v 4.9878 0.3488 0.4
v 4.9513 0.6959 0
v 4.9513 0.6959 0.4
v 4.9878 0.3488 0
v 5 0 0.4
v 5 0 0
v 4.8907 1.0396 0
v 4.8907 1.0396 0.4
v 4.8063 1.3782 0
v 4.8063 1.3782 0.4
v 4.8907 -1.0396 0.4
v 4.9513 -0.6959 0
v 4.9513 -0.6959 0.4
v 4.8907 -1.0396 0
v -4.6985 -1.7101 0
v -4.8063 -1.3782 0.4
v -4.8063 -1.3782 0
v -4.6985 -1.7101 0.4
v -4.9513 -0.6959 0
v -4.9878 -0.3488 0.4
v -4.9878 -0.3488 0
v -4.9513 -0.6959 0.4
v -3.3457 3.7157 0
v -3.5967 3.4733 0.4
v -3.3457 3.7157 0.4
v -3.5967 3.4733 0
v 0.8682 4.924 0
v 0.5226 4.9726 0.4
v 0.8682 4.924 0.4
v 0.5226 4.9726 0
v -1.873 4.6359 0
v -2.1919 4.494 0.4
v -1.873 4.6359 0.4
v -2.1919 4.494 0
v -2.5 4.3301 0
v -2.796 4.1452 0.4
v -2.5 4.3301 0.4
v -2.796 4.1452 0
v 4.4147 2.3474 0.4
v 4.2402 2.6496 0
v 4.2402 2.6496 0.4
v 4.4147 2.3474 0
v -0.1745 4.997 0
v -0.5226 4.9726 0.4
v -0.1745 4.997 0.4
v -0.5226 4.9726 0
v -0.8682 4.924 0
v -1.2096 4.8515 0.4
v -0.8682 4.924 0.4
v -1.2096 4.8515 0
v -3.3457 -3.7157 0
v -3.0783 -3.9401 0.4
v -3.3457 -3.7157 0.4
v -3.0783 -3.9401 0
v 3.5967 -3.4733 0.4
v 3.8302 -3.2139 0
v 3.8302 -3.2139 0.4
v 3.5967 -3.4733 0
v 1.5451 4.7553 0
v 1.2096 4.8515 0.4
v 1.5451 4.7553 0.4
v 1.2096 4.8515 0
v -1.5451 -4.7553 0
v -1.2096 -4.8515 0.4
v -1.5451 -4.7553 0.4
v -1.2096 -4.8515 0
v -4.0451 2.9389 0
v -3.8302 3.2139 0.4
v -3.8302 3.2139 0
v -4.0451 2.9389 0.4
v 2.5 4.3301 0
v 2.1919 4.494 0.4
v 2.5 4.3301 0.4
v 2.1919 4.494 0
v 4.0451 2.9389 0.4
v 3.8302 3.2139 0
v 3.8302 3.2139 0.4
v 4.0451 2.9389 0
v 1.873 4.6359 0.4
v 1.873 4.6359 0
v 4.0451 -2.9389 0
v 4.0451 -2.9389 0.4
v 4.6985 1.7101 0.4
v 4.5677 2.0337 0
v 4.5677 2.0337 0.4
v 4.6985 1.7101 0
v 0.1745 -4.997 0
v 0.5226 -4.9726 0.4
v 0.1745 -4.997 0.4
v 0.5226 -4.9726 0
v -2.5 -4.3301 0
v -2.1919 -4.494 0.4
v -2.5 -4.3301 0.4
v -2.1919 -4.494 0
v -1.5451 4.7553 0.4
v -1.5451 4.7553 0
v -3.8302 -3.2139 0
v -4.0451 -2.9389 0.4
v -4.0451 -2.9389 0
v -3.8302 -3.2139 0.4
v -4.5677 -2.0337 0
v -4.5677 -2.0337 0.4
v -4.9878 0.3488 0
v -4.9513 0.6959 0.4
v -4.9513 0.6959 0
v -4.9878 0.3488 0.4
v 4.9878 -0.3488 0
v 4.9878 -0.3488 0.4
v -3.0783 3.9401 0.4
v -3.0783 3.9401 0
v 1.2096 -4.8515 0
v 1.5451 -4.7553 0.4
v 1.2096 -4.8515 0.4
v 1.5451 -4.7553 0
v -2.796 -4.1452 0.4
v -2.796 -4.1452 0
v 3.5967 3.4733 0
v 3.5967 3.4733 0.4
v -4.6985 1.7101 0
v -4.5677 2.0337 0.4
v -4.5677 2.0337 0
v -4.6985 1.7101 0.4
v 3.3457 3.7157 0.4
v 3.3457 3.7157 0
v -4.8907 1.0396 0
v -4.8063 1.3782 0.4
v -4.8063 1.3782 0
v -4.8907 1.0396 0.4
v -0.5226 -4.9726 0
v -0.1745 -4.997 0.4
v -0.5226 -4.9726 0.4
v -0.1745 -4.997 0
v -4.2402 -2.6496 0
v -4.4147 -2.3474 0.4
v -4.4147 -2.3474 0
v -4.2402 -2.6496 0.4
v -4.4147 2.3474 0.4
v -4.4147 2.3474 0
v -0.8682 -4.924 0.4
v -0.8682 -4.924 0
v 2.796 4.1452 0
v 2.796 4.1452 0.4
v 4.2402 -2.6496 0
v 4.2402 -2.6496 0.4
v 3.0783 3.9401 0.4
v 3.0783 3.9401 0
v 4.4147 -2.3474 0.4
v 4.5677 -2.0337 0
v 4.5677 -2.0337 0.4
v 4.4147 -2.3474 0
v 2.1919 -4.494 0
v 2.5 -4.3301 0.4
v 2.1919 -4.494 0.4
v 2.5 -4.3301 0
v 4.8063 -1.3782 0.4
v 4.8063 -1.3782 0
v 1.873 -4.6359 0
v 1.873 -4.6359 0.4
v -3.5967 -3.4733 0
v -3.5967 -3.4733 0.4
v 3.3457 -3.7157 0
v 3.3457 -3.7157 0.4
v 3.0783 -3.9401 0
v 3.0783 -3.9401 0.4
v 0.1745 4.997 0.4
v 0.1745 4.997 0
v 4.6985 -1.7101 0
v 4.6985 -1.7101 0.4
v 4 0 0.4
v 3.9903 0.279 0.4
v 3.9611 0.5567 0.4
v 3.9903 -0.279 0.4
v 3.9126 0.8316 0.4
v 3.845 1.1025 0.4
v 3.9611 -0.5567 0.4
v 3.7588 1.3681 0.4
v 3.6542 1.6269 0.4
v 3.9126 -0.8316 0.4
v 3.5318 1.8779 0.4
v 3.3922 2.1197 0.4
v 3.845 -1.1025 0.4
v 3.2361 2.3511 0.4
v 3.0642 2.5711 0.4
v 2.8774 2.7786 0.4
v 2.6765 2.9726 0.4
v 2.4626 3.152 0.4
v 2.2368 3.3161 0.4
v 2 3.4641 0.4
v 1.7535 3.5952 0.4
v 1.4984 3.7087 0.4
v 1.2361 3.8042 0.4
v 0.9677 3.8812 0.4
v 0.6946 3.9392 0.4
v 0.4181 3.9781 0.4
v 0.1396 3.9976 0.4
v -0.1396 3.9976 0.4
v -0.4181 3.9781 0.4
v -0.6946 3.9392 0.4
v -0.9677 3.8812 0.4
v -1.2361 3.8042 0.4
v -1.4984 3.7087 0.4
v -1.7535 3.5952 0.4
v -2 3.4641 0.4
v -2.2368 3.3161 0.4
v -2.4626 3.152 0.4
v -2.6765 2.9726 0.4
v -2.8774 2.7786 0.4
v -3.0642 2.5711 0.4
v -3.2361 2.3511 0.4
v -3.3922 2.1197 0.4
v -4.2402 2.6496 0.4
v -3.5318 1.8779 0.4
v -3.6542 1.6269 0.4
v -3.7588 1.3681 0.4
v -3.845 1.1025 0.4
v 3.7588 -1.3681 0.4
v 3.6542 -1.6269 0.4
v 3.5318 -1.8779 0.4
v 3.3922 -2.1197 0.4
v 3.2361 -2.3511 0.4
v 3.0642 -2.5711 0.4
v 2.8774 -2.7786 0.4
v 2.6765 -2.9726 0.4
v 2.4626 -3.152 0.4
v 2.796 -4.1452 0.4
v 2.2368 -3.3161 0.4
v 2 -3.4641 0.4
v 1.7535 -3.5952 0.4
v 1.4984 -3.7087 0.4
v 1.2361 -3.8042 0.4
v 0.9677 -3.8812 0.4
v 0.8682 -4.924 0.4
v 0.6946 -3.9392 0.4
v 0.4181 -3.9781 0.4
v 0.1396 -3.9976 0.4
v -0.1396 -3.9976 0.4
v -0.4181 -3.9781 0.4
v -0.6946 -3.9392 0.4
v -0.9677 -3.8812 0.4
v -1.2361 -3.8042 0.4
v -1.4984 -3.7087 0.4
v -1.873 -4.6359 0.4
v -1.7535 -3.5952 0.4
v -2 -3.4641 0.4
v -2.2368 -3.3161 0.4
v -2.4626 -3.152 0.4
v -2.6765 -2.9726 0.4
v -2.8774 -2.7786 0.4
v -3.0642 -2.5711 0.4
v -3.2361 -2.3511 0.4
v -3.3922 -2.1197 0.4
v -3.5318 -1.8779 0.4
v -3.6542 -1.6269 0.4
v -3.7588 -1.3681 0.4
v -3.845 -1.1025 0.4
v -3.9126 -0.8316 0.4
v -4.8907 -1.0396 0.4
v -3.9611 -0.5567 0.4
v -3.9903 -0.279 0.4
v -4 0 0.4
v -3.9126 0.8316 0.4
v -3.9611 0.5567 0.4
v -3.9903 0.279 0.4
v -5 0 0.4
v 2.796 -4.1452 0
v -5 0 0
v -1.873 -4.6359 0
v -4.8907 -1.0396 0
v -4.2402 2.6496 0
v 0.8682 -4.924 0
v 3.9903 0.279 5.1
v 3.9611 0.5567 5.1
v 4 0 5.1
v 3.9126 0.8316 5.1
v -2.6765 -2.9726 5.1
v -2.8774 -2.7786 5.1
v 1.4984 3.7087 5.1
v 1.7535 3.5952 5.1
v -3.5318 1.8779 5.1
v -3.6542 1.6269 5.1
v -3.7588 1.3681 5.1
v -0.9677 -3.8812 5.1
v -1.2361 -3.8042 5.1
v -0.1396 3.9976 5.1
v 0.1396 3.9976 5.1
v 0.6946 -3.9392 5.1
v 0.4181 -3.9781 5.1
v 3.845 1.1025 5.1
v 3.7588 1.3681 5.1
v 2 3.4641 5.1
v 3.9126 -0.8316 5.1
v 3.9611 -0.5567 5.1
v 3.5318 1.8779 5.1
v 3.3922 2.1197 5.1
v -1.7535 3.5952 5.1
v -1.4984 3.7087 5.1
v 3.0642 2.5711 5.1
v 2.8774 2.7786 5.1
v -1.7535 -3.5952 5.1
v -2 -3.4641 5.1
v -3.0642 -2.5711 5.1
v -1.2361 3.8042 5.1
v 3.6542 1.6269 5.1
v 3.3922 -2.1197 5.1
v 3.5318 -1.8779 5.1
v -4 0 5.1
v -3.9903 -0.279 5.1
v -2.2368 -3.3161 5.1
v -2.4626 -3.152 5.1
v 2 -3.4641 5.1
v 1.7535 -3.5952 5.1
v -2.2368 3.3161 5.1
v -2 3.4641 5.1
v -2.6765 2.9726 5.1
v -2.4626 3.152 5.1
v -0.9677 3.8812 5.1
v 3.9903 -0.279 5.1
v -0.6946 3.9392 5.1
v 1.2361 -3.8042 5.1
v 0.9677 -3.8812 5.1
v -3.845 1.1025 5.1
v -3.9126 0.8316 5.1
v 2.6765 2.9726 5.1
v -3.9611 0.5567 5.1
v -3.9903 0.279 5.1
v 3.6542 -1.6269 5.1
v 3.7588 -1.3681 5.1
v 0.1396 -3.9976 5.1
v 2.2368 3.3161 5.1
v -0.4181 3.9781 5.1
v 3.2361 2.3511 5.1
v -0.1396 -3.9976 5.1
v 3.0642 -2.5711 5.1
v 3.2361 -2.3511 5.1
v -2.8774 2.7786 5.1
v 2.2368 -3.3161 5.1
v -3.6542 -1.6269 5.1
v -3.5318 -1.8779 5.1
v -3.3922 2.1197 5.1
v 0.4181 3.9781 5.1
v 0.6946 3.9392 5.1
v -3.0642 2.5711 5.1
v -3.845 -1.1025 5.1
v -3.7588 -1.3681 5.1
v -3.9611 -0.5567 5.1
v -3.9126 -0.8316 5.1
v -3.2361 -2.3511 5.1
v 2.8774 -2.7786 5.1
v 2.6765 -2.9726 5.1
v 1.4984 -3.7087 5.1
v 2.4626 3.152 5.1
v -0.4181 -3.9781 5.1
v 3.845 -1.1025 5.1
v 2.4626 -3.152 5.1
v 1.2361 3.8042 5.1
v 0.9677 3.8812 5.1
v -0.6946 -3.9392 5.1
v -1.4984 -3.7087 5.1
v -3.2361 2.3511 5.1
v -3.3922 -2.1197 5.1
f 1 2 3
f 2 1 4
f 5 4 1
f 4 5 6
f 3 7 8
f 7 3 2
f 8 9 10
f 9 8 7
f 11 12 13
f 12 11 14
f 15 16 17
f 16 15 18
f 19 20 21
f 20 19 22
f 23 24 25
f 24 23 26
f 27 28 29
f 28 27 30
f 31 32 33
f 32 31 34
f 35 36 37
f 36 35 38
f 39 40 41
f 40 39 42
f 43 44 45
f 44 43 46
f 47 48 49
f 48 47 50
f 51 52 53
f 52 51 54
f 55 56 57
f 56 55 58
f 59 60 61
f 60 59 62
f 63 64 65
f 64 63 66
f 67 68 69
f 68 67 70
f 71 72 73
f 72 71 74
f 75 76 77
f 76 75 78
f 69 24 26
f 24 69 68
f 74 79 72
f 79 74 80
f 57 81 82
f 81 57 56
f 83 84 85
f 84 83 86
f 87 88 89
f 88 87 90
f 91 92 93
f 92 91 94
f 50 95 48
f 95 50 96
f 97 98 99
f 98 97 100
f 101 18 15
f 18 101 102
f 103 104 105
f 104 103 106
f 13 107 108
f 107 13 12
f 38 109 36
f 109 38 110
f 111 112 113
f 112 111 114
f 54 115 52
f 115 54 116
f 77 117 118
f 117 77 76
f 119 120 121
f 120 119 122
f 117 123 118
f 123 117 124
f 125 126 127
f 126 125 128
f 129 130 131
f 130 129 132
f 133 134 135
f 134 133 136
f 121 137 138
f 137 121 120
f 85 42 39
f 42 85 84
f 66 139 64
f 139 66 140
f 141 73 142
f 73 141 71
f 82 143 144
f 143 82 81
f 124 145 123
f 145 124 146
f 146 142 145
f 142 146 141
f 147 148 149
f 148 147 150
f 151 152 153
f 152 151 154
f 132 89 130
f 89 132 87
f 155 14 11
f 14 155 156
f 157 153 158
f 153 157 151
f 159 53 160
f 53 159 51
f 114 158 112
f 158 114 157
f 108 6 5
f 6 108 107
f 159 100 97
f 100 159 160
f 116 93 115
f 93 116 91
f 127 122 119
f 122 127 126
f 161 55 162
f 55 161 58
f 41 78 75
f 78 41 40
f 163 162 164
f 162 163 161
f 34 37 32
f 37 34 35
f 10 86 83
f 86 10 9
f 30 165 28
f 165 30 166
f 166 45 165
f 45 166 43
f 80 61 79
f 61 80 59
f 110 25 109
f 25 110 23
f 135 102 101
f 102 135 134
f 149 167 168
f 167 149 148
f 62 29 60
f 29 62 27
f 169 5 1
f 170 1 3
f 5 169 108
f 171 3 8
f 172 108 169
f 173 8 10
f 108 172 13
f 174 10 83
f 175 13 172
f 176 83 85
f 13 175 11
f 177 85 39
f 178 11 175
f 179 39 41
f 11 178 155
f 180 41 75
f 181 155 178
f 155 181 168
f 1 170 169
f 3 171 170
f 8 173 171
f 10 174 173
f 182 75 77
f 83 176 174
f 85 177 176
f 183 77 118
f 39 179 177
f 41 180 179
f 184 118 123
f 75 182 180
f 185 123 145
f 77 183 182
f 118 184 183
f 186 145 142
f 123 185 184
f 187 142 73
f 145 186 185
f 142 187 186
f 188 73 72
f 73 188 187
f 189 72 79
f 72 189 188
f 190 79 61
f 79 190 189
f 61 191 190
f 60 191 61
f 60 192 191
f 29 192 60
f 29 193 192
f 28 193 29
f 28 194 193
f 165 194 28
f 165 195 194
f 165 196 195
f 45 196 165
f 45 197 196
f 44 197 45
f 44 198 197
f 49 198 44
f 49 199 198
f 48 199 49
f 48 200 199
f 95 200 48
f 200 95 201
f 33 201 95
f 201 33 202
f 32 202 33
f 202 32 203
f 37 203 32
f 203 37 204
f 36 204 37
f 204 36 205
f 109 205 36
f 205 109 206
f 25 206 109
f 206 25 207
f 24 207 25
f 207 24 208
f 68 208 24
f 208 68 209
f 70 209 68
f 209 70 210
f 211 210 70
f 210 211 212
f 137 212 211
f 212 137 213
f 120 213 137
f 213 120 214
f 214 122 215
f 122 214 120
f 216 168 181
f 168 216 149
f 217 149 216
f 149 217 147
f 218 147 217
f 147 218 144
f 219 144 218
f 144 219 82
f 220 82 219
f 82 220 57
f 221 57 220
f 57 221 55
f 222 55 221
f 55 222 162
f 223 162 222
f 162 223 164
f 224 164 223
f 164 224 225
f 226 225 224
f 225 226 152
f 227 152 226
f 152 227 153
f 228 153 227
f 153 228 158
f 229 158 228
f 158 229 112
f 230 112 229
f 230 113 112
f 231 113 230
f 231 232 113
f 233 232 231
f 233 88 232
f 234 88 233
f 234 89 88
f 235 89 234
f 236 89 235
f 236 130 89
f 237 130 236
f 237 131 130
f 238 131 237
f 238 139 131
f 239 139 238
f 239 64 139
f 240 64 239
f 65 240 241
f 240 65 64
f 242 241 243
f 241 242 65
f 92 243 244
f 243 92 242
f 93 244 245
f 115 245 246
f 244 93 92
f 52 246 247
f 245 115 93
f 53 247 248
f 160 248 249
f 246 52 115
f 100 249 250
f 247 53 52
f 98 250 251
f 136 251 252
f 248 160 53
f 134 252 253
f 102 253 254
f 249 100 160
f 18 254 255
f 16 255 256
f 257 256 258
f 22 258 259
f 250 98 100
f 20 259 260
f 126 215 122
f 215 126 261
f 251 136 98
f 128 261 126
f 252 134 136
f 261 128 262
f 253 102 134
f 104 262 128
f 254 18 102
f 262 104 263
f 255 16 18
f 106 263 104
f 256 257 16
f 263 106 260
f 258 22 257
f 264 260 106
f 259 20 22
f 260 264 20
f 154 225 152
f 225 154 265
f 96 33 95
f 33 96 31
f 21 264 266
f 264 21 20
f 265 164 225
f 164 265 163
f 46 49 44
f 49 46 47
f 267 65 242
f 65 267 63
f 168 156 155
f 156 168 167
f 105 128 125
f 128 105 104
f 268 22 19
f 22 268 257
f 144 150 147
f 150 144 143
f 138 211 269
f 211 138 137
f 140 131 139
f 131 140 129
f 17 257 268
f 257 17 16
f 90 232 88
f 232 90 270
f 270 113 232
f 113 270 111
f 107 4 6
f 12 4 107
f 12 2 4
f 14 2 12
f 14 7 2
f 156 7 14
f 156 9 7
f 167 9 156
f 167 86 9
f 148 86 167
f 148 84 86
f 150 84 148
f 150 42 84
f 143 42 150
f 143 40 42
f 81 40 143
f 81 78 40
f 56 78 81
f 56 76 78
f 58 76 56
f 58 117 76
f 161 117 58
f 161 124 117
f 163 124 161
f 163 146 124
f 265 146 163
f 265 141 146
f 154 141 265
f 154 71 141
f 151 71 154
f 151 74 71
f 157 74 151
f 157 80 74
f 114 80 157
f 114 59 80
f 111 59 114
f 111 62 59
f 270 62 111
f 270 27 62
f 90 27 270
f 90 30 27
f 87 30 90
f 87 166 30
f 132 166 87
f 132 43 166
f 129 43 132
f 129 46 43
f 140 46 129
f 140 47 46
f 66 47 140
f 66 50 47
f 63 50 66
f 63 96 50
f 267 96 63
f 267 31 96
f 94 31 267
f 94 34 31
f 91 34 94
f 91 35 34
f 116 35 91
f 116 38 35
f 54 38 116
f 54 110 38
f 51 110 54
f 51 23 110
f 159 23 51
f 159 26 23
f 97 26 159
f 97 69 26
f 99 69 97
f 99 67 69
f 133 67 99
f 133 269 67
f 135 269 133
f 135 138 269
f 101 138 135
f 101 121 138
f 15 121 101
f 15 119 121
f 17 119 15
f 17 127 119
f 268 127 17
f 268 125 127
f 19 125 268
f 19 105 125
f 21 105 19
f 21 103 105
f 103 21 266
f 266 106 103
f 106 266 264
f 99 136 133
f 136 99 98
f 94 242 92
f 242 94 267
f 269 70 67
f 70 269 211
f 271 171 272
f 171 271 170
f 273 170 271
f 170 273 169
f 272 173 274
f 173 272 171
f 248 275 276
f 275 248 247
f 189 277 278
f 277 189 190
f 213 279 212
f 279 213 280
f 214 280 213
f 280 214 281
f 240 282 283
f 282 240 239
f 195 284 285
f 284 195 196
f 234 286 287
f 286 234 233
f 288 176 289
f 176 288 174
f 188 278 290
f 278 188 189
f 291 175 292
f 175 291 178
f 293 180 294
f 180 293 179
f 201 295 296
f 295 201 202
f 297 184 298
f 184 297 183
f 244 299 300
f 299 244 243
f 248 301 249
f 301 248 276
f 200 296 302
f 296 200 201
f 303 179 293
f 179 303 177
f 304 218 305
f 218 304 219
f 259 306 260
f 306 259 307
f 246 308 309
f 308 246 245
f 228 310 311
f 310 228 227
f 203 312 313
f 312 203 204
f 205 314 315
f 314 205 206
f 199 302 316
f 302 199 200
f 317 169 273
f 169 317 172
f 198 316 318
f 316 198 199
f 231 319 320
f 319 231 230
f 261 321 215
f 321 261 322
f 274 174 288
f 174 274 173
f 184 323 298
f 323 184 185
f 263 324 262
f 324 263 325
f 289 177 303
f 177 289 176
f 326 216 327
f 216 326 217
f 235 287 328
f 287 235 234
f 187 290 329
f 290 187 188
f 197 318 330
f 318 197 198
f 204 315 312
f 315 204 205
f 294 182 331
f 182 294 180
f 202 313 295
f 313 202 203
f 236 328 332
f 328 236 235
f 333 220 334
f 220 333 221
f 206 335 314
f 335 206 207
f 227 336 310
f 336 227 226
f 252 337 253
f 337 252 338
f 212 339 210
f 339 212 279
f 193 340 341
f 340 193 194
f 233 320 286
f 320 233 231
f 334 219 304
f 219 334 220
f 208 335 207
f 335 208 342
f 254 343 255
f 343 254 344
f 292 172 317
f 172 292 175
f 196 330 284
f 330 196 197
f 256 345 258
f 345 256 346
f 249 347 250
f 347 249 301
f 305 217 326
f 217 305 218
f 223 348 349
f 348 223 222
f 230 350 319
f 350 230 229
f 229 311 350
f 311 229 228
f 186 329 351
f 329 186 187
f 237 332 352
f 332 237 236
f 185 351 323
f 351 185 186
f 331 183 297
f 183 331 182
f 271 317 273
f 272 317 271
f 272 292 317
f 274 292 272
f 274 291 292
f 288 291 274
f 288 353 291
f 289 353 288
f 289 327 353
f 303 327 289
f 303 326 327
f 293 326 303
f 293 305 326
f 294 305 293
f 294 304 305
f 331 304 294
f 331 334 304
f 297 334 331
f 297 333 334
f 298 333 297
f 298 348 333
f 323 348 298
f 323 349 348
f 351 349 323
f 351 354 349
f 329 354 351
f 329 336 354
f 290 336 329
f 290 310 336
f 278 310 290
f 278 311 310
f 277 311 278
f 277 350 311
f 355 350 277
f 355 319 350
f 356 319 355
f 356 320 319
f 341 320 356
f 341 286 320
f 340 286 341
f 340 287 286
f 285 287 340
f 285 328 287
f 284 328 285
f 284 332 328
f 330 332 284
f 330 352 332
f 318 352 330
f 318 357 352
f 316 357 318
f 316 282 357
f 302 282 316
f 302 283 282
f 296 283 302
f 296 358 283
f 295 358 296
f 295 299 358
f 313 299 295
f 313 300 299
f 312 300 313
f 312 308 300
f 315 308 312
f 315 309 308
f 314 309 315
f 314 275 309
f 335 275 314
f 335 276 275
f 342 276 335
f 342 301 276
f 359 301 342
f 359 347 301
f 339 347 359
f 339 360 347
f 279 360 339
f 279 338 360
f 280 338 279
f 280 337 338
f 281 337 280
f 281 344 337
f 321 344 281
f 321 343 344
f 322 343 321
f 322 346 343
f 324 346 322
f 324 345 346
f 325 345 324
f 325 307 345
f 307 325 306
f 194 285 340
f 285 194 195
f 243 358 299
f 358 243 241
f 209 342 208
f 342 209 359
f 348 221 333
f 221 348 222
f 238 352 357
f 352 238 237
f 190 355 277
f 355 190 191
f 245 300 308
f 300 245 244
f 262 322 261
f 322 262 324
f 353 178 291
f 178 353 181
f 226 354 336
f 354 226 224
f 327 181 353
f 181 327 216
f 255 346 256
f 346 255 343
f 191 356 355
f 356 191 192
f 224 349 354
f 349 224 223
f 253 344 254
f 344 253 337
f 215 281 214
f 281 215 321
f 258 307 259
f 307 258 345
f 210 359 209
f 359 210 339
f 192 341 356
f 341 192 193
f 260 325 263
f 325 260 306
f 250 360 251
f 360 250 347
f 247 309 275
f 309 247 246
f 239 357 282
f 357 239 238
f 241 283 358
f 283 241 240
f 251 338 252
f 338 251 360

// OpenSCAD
union() {
    cylinder(h=.4,d=10,$fn=90);
    cylinder(h=5.1,d=8,$fn=90);
}
